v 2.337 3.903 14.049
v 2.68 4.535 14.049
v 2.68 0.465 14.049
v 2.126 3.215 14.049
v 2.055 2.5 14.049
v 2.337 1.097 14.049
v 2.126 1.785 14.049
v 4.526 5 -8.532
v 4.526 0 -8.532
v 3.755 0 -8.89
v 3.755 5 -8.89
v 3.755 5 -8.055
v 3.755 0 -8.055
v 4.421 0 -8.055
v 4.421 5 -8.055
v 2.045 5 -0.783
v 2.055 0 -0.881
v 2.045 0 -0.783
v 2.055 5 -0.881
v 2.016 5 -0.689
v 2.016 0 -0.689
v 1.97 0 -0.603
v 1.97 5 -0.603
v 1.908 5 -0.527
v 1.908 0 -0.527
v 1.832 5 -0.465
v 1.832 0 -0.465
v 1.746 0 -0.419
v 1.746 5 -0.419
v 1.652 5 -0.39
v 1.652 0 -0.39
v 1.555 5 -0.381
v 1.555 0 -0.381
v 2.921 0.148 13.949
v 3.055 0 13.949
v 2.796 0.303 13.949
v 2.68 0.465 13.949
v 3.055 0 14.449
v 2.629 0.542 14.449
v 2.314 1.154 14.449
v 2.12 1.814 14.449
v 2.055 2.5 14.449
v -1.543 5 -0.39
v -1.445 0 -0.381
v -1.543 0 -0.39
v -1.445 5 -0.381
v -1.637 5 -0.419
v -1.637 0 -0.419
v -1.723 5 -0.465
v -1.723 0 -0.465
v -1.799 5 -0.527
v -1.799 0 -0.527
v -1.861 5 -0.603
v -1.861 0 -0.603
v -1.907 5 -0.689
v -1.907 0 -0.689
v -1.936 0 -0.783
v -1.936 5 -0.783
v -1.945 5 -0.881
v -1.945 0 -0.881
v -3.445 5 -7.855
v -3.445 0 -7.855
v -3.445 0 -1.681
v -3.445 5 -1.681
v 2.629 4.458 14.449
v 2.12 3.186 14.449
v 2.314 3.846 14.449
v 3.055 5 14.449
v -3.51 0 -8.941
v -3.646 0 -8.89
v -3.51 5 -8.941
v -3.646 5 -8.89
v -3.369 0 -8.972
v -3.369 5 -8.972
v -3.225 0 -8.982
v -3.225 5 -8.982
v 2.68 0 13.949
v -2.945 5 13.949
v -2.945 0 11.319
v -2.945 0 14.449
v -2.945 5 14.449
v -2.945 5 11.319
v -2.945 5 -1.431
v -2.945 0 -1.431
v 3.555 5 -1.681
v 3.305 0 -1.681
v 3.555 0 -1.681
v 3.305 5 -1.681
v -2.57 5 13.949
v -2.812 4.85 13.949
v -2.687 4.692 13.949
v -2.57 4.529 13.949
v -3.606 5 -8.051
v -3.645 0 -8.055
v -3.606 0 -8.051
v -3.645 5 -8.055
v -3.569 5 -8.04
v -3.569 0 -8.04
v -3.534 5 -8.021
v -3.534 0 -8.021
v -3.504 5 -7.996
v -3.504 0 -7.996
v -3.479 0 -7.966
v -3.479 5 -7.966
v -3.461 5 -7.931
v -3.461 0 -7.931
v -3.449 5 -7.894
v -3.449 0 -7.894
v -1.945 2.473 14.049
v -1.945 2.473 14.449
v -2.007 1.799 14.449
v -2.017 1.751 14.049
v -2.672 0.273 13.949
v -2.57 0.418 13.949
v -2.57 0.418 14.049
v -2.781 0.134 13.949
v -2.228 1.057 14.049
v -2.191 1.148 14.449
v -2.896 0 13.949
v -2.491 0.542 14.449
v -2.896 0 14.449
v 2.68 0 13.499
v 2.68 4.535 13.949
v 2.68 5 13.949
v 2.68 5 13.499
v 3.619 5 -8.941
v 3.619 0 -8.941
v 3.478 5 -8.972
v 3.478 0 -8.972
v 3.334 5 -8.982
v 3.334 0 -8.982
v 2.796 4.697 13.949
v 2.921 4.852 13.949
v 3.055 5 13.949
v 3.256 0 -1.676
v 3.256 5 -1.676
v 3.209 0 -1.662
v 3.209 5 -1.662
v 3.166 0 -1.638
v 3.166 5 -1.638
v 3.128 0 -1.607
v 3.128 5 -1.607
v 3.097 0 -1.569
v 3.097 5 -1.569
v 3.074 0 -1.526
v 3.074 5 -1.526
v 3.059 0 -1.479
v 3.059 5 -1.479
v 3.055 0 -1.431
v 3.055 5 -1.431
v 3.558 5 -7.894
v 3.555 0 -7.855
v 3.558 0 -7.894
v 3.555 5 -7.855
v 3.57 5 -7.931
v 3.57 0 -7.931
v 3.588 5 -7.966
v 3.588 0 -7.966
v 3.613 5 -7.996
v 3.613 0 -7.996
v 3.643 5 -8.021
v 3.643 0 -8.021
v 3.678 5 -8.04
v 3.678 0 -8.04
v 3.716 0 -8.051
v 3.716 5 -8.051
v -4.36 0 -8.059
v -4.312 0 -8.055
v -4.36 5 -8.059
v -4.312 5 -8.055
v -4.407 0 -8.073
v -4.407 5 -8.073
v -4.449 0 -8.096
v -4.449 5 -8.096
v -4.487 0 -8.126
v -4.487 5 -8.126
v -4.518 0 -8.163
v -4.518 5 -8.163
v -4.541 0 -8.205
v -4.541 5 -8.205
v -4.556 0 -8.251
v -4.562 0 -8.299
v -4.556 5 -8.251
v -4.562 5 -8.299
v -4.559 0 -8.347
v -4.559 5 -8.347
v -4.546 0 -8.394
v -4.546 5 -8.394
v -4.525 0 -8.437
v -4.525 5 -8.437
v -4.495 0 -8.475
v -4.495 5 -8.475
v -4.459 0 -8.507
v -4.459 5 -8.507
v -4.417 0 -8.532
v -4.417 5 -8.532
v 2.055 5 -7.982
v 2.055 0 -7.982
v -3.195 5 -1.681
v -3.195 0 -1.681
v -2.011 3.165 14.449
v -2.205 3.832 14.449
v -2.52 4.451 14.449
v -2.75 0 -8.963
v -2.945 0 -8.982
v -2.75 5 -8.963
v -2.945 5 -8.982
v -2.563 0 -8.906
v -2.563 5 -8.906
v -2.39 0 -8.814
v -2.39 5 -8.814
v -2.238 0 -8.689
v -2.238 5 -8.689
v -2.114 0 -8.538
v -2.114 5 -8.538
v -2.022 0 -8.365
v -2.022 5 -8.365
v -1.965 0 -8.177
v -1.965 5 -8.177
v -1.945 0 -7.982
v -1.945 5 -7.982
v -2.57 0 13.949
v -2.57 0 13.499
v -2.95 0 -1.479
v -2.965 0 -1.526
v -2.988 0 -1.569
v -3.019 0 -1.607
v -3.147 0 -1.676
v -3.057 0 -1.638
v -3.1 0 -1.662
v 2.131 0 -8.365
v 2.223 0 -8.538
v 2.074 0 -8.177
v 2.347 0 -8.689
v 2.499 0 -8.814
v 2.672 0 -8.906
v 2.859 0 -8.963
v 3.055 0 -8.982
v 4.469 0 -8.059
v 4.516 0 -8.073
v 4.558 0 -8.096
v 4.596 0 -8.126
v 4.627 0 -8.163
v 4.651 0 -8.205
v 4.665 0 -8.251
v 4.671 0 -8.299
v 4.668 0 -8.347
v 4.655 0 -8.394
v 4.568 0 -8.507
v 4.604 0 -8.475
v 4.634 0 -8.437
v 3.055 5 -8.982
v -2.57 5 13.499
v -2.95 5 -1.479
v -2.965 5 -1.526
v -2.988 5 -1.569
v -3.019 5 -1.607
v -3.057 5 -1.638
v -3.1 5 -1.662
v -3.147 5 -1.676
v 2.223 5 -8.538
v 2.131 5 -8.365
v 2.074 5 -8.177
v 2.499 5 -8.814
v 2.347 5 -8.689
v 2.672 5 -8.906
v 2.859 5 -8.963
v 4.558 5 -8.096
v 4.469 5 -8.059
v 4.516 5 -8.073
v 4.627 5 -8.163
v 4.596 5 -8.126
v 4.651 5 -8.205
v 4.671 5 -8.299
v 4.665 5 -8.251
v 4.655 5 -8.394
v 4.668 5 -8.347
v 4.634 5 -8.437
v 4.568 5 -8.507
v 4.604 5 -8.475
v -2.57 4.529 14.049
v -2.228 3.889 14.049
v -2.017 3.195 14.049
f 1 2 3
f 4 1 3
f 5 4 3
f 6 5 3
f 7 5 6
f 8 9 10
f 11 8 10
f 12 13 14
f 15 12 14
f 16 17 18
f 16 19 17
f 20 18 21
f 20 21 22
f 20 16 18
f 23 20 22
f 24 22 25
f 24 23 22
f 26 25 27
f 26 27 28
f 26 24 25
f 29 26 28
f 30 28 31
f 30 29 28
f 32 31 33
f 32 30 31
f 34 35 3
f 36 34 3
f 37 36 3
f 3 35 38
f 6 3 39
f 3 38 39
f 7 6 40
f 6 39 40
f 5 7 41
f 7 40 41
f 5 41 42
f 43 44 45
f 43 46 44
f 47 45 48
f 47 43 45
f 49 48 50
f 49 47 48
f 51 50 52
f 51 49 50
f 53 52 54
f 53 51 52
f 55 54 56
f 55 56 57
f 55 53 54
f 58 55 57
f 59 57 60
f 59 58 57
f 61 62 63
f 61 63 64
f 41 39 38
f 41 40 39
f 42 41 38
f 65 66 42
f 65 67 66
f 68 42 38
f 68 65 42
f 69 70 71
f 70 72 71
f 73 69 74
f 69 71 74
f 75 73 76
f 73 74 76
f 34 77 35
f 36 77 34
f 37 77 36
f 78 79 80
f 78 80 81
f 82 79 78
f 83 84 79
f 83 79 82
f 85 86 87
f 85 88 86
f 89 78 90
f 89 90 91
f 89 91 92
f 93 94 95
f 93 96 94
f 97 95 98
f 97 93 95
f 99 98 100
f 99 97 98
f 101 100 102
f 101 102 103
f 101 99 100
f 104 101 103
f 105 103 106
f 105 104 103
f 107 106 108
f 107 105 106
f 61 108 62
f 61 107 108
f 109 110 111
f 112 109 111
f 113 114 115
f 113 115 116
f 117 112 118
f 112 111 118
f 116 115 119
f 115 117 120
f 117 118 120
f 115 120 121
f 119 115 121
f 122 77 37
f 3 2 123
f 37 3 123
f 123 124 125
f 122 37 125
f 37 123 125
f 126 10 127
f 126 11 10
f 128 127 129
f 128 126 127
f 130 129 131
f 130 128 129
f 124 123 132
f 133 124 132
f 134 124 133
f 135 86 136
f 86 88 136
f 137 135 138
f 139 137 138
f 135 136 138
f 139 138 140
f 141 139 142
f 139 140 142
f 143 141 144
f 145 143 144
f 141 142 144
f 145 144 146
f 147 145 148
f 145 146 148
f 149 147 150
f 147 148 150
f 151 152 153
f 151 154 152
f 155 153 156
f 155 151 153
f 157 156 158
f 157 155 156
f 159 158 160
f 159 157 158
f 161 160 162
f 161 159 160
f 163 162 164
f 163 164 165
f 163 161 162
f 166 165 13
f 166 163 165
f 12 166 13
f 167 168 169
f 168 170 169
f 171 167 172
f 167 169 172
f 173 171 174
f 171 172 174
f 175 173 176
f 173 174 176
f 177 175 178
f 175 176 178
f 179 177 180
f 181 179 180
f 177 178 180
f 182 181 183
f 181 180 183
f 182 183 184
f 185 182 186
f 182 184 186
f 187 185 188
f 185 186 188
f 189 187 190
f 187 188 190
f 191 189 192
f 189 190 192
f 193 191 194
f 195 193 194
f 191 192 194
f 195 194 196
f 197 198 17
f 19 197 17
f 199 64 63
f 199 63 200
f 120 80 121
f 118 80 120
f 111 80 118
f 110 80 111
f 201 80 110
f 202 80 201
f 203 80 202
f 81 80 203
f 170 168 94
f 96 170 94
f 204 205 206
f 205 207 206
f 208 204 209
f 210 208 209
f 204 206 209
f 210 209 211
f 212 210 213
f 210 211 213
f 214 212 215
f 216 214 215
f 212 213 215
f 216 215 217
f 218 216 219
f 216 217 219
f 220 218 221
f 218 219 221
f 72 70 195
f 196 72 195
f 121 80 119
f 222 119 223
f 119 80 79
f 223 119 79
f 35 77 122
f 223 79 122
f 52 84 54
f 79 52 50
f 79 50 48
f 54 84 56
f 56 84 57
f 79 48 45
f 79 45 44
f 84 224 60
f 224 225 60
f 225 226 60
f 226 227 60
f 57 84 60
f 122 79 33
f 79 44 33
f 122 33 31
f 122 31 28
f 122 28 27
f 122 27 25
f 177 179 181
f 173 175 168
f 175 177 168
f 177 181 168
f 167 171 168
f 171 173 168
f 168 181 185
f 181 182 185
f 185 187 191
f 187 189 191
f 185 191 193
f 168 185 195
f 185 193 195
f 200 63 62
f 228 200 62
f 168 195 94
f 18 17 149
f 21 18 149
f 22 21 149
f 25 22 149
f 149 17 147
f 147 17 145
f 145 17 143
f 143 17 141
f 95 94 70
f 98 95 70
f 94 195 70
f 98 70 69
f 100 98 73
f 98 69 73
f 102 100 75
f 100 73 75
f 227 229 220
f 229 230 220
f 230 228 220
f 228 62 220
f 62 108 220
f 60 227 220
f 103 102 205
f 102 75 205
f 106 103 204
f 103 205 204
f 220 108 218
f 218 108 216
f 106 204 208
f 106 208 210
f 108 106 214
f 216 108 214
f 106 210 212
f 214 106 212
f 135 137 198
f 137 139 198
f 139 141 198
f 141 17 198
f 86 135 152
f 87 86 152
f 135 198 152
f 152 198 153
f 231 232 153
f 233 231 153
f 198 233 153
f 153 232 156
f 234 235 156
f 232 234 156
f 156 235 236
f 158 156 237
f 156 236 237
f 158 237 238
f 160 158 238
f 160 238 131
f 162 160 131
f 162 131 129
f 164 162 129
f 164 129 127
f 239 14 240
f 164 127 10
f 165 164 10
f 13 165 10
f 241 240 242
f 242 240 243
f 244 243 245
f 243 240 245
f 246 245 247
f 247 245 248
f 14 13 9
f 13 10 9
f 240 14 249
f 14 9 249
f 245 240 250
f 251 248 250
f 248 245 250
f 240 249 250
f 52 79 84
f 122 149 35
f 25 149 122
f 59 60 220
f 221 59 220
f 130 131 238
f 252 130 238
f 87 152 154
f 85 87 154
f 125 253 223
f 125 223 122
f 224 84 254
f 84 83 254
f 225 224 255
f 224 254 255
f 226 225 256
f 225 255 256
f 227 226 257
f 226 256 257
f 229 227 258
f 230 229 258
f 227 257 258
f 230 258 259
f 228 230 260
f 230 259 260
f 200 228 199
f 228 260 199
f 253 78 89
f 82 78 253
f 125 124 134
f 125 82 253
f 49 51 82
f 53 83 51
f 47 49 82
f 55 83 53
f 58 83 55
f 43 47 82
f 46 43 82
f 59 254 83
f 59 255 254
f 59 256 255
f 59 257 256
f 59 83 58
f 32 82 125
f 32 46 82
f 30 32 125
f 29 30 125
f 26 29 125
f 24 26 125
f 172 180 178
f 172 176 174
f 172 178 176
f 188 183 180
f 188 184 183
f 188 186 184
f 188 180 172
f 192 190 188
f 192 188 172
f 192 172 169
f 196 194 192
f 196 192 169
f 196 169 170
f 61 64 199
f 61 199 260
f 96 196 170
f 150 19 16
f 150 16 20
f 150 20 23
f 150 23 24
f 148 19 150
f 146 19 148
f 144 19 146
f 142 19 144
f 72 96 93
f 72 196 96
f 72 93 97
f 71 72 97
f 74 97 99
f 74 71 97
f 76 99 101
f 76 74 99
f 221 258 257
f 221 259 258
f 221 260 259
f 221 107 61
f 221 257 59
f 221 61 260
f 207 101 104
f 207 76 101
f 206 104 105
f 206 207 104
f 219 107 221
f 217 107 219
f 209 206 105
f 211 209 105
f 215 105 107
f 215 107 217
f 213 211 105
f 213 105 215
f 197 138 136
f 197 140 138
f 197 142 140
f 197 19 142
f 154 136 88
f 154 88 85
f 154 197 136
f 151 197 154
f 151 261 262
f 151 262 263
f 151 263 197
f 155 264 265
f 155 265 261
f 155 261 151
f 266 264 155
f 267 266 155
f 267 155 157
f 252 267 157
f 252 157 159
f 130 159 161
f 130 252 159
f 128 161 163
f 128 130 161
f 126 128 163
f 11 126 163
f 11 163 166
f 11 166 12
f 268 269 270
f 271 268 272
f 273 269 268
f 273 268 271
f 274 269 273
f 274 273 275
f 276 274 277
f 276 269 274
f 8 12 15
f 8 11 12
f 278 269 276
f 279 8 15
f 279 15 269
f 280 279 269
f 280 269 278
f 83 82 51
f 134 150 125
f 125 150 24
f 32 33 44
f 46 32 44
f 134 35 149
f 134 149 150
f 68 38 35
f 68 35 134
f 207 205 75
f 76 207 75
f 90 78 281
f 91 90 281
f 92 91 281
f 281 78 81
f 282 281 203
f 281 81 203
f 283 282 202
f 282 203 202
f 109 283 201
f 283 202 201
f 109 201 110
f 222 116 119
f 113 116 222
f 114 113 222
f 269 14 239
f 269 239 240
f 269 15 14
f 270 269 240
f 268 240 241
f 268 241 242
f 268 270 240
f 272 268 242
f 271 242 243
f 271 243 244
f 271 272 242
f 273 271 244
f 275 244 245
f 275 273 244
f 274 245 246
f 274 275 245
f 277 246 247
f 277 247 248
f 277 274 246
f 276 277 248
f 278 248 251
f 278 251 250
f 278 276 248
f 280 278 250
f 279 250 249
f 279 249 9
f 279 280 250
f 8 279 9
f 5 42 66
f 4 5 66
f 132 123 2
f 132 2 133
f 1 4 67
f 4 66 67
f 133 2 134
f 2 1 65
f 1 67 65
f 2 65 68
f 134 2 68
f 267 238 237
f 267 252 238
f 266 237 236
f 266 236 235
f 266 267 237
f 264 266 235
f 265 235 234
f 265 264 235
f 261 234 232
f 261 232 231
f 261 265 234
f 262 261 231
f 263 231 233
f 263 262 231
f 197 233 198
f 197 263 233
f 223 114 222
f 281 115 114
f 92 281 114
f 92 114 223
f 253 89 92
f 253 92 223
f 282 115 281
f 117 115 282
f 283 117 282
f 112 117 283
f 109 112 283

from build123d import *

# Parameters (mm, degrees)
BOSS_EXTRUDE1_DEPTH = 5
FILLET2_R           = 0.2
FILLET3_R           = 1
FILLET6_R           = 0.5
SKETCH3_W           = 7
SKETCH3_H           = 5
BOSS_EXTRUDE2_DEPTH = 7.2
SKETCH4_W           = 6
SKETCH4_H           = 5
BOSS_EXTRUDE3_DEPTH = 3.13
SKETCH5_W           = 5.25
SKETCH5_H           = 0.55
CUT_EXTRUDE1_DEPTH  = 6
FILLET8_R           = 0.25
SKETCH9_W           = 0.605295755
SKETCH9_H           = 5
CUT_EXTRUDE5_DEPTH  = 13
SKETCH10_W          = 0.5
SKETCH10_H          = 5
CUT_EXTRUDE6_DEPTH  = 13
FILLET16_R          = 0.25
SKETCH12_W          = 4
SKETCH12_H          = 5
CUT_EXTRUDE7_DEPTH  = 0.4
CUT_EXTRUDE8_DEPTH  = 0.5


with BuildPart() as part:
    # Sketch2 → Boss-Extrude1 (new body)
    with BuildSketch(Plane(origin=(0, 0, 0), x_dir=(1, 0, 0), z_dir=(0, 1, 0))):
        Polygon((-3.445470037, -4.119402442), (3.554529963, -4.119402442), (3.554529963, 8.054782302), (5.554529963, 8.054782302), (3.554529963, 8.982336318), (2.054529963, 8.982336318), (2.054529963, 0.380597558), (-1.945470037, 0.380597558), (-1.945470037, 8.982336318), (-3.445470037, 8.982336318), (-5.445470037, 8.054782302), (-3.445470037, 8.054782302), align=None)
    extrude(amount=BOSS_EXTRUDE1_DEPTH)

    # Fillet2
    fillet2_edges = [part.edges().sort_by_distance(p)[0] for p in [
        (-3.445470037, 2.5, -8.054782302),
        (3.554529963, 2.5, -8.054782302),
    ]]
    fillet(fillet2_edges, radius=FILLET2_R)

    # Fillet3
    fillet3_edges = [part.edges().sort_by_distance(p)[0] for p in [
        (-3.445470037, 2.5, -8.982336318),
        (-1.945470037, 2.5, -8.982336318),
        (2.054529963, 2.5, -8.982336318),
        (3.554529963, 2.5, -8.982336318),
    ]]
    fillet(fillet3_edges, radius=FILLET3_R)

    # Fillet6
    fillet6_edges = [part.edges().sort_by_distance(p)[0] for p in [
        (-1.945470037, 2.5, -0.380597558),
        (2.054529963, 2.5, -0.380597558),
    ]]
    fillet(fillet6_edges, radius=FILLET6_R)

    # Sketch3 → Boss-Extrude2 (add)
    with BuildSketch(Plane.XY.offset(4.119402442)):
        with Locations((0.054529963, 2.5)):
            Rectangle(SKETCH3_W, SKETCH3_H)
    extrude(amount=BOSS_EXTRUDE2_DEPTH)

    # Sketch4 → Boss-Extrude3 (add)
    with BuildSketch(Plane.XY.offset(11.319402442)):
        with Locations((0.054529963, 2.5)):
            Rectangle(SKETCH4_W, SKETCH4_H)
    extrude(amount=BOSS_EXTRUDE3_DEPTH)

    # Sketch5 → Cut-Extrude1 (cut)
    with BuildSketch(Plane(origin=(0, 5, 0), x_dir=(1, 0, 0), z_dir=(0, 1, 0))):
        with Locations((0.054529963, -13.774402442)):
            Rectangle(SKETCH5_W, SKETCH5_H)
    extrude(amount=-CUT_EXTRUDE1_DEPTH, mode=Mode.SUBTRACT)

    # Fillet8
    fillet8_edges = [part.edges().sort_by_distance(p)[0] for p in [
        (-5.445470037, 2.5, -8.054782302),
        (5.554529963, 2.5, -8.054782302),
    ]]
    fillet(fillet8_edges, radius=FILLET8_R)

    # Sketch9 → Cut-Extrude5 (cut)
    with BuildSketch(Plane.XY.offset(11.319402442)):
        with Locations((-3.248117915, 2.5)):
            Rectangle(SKETCH9_W, SKETCH9_H)
    extrude(amount=-CUT_EXTRUDE5_DEPTH, mode=Mode.SUBTRACT)

    # Sketch10 → Cut-Extrude6 (cut)
    with BuildSketch(Plane.XY.offset(11.319402442)):
        with Locations((3.304529963, 2.5)):
            Rectangle(SKETCH10_W, SKETCH10_H)
    extrude(amount=-CUT_EXTRUDE6_DEPTH, mode=Mode.SUBTRACT)

    # Fillet16
    fillet16_edges = [part.edges().sort_by_distance(p)[0] for p in [
        (-2.945470037, 2.5, -1.680597558),
        (3.054529963, 2.5, -1.680597558),
    ]]
    fillet(fillet16_edges, radius=FILLET16_R)

    # Sketch12 → Cut-Extrude7 (cut)
    with BuildSketch(Plane.XY.offset(14.449402442)):
        with Locations((0.054529963, 2.5)):
            Rectangle(SKETCH12_W, SKETCH12_H)
    extrude(amount=-CUT_EXTRUDE7_DEPTH, mode=Mode.SUBTRACT)

    # Sketch14 → Cut-Extrude8 (cut)
    with BuildSketch(Plane.XY.offset(14.449402442)):
        with BuildLine():
            Line((-1.945470037, 5), (-2.945470037, 5))
            ThreePointArc((-2.945470037, 5), (-2.204559454, 3.831888923), (-1.945470037, 2.473100986))
            Line((-1.945470037, 2.473100986), (-1.945470037, 5))
        make_face()
        with BuildLine():
            Line((-1.945470037, 0), (-1.945470037, 2.473100986))
            ThreePointArc((-1.945470037, 2.473100986), (-2.191277733, 1.14836624), (-2.895975223, 0))
            Line((-2.895975223, 0), (-1.945470037, 0))
        make_face()
        with BuildLine():
            Line((2.054529963, 0), (3.054529963, 0))
            ThreePointArc((3.054529963, 0), (2.313801958, 1.153708798), (2.054529963, 2.5))
            Line((2.054529963, 2.5), (2.054529963, 0))
        make_face()
        with BuildLine():
            ThreePointArc((2.054529963, 2.5), (2.313801958, 3.846291202), (3.054529963, 5))
            Line((3.054529963, 5), (2.054529963, 5))
            Line((2.054529963, 5), (2.054529963, 2.5))
        make_face()
    extrude(amount=-CUT_EXTRUDE8_DEPTH, mode=Mode.SUBTRACT)


solid = part.part
